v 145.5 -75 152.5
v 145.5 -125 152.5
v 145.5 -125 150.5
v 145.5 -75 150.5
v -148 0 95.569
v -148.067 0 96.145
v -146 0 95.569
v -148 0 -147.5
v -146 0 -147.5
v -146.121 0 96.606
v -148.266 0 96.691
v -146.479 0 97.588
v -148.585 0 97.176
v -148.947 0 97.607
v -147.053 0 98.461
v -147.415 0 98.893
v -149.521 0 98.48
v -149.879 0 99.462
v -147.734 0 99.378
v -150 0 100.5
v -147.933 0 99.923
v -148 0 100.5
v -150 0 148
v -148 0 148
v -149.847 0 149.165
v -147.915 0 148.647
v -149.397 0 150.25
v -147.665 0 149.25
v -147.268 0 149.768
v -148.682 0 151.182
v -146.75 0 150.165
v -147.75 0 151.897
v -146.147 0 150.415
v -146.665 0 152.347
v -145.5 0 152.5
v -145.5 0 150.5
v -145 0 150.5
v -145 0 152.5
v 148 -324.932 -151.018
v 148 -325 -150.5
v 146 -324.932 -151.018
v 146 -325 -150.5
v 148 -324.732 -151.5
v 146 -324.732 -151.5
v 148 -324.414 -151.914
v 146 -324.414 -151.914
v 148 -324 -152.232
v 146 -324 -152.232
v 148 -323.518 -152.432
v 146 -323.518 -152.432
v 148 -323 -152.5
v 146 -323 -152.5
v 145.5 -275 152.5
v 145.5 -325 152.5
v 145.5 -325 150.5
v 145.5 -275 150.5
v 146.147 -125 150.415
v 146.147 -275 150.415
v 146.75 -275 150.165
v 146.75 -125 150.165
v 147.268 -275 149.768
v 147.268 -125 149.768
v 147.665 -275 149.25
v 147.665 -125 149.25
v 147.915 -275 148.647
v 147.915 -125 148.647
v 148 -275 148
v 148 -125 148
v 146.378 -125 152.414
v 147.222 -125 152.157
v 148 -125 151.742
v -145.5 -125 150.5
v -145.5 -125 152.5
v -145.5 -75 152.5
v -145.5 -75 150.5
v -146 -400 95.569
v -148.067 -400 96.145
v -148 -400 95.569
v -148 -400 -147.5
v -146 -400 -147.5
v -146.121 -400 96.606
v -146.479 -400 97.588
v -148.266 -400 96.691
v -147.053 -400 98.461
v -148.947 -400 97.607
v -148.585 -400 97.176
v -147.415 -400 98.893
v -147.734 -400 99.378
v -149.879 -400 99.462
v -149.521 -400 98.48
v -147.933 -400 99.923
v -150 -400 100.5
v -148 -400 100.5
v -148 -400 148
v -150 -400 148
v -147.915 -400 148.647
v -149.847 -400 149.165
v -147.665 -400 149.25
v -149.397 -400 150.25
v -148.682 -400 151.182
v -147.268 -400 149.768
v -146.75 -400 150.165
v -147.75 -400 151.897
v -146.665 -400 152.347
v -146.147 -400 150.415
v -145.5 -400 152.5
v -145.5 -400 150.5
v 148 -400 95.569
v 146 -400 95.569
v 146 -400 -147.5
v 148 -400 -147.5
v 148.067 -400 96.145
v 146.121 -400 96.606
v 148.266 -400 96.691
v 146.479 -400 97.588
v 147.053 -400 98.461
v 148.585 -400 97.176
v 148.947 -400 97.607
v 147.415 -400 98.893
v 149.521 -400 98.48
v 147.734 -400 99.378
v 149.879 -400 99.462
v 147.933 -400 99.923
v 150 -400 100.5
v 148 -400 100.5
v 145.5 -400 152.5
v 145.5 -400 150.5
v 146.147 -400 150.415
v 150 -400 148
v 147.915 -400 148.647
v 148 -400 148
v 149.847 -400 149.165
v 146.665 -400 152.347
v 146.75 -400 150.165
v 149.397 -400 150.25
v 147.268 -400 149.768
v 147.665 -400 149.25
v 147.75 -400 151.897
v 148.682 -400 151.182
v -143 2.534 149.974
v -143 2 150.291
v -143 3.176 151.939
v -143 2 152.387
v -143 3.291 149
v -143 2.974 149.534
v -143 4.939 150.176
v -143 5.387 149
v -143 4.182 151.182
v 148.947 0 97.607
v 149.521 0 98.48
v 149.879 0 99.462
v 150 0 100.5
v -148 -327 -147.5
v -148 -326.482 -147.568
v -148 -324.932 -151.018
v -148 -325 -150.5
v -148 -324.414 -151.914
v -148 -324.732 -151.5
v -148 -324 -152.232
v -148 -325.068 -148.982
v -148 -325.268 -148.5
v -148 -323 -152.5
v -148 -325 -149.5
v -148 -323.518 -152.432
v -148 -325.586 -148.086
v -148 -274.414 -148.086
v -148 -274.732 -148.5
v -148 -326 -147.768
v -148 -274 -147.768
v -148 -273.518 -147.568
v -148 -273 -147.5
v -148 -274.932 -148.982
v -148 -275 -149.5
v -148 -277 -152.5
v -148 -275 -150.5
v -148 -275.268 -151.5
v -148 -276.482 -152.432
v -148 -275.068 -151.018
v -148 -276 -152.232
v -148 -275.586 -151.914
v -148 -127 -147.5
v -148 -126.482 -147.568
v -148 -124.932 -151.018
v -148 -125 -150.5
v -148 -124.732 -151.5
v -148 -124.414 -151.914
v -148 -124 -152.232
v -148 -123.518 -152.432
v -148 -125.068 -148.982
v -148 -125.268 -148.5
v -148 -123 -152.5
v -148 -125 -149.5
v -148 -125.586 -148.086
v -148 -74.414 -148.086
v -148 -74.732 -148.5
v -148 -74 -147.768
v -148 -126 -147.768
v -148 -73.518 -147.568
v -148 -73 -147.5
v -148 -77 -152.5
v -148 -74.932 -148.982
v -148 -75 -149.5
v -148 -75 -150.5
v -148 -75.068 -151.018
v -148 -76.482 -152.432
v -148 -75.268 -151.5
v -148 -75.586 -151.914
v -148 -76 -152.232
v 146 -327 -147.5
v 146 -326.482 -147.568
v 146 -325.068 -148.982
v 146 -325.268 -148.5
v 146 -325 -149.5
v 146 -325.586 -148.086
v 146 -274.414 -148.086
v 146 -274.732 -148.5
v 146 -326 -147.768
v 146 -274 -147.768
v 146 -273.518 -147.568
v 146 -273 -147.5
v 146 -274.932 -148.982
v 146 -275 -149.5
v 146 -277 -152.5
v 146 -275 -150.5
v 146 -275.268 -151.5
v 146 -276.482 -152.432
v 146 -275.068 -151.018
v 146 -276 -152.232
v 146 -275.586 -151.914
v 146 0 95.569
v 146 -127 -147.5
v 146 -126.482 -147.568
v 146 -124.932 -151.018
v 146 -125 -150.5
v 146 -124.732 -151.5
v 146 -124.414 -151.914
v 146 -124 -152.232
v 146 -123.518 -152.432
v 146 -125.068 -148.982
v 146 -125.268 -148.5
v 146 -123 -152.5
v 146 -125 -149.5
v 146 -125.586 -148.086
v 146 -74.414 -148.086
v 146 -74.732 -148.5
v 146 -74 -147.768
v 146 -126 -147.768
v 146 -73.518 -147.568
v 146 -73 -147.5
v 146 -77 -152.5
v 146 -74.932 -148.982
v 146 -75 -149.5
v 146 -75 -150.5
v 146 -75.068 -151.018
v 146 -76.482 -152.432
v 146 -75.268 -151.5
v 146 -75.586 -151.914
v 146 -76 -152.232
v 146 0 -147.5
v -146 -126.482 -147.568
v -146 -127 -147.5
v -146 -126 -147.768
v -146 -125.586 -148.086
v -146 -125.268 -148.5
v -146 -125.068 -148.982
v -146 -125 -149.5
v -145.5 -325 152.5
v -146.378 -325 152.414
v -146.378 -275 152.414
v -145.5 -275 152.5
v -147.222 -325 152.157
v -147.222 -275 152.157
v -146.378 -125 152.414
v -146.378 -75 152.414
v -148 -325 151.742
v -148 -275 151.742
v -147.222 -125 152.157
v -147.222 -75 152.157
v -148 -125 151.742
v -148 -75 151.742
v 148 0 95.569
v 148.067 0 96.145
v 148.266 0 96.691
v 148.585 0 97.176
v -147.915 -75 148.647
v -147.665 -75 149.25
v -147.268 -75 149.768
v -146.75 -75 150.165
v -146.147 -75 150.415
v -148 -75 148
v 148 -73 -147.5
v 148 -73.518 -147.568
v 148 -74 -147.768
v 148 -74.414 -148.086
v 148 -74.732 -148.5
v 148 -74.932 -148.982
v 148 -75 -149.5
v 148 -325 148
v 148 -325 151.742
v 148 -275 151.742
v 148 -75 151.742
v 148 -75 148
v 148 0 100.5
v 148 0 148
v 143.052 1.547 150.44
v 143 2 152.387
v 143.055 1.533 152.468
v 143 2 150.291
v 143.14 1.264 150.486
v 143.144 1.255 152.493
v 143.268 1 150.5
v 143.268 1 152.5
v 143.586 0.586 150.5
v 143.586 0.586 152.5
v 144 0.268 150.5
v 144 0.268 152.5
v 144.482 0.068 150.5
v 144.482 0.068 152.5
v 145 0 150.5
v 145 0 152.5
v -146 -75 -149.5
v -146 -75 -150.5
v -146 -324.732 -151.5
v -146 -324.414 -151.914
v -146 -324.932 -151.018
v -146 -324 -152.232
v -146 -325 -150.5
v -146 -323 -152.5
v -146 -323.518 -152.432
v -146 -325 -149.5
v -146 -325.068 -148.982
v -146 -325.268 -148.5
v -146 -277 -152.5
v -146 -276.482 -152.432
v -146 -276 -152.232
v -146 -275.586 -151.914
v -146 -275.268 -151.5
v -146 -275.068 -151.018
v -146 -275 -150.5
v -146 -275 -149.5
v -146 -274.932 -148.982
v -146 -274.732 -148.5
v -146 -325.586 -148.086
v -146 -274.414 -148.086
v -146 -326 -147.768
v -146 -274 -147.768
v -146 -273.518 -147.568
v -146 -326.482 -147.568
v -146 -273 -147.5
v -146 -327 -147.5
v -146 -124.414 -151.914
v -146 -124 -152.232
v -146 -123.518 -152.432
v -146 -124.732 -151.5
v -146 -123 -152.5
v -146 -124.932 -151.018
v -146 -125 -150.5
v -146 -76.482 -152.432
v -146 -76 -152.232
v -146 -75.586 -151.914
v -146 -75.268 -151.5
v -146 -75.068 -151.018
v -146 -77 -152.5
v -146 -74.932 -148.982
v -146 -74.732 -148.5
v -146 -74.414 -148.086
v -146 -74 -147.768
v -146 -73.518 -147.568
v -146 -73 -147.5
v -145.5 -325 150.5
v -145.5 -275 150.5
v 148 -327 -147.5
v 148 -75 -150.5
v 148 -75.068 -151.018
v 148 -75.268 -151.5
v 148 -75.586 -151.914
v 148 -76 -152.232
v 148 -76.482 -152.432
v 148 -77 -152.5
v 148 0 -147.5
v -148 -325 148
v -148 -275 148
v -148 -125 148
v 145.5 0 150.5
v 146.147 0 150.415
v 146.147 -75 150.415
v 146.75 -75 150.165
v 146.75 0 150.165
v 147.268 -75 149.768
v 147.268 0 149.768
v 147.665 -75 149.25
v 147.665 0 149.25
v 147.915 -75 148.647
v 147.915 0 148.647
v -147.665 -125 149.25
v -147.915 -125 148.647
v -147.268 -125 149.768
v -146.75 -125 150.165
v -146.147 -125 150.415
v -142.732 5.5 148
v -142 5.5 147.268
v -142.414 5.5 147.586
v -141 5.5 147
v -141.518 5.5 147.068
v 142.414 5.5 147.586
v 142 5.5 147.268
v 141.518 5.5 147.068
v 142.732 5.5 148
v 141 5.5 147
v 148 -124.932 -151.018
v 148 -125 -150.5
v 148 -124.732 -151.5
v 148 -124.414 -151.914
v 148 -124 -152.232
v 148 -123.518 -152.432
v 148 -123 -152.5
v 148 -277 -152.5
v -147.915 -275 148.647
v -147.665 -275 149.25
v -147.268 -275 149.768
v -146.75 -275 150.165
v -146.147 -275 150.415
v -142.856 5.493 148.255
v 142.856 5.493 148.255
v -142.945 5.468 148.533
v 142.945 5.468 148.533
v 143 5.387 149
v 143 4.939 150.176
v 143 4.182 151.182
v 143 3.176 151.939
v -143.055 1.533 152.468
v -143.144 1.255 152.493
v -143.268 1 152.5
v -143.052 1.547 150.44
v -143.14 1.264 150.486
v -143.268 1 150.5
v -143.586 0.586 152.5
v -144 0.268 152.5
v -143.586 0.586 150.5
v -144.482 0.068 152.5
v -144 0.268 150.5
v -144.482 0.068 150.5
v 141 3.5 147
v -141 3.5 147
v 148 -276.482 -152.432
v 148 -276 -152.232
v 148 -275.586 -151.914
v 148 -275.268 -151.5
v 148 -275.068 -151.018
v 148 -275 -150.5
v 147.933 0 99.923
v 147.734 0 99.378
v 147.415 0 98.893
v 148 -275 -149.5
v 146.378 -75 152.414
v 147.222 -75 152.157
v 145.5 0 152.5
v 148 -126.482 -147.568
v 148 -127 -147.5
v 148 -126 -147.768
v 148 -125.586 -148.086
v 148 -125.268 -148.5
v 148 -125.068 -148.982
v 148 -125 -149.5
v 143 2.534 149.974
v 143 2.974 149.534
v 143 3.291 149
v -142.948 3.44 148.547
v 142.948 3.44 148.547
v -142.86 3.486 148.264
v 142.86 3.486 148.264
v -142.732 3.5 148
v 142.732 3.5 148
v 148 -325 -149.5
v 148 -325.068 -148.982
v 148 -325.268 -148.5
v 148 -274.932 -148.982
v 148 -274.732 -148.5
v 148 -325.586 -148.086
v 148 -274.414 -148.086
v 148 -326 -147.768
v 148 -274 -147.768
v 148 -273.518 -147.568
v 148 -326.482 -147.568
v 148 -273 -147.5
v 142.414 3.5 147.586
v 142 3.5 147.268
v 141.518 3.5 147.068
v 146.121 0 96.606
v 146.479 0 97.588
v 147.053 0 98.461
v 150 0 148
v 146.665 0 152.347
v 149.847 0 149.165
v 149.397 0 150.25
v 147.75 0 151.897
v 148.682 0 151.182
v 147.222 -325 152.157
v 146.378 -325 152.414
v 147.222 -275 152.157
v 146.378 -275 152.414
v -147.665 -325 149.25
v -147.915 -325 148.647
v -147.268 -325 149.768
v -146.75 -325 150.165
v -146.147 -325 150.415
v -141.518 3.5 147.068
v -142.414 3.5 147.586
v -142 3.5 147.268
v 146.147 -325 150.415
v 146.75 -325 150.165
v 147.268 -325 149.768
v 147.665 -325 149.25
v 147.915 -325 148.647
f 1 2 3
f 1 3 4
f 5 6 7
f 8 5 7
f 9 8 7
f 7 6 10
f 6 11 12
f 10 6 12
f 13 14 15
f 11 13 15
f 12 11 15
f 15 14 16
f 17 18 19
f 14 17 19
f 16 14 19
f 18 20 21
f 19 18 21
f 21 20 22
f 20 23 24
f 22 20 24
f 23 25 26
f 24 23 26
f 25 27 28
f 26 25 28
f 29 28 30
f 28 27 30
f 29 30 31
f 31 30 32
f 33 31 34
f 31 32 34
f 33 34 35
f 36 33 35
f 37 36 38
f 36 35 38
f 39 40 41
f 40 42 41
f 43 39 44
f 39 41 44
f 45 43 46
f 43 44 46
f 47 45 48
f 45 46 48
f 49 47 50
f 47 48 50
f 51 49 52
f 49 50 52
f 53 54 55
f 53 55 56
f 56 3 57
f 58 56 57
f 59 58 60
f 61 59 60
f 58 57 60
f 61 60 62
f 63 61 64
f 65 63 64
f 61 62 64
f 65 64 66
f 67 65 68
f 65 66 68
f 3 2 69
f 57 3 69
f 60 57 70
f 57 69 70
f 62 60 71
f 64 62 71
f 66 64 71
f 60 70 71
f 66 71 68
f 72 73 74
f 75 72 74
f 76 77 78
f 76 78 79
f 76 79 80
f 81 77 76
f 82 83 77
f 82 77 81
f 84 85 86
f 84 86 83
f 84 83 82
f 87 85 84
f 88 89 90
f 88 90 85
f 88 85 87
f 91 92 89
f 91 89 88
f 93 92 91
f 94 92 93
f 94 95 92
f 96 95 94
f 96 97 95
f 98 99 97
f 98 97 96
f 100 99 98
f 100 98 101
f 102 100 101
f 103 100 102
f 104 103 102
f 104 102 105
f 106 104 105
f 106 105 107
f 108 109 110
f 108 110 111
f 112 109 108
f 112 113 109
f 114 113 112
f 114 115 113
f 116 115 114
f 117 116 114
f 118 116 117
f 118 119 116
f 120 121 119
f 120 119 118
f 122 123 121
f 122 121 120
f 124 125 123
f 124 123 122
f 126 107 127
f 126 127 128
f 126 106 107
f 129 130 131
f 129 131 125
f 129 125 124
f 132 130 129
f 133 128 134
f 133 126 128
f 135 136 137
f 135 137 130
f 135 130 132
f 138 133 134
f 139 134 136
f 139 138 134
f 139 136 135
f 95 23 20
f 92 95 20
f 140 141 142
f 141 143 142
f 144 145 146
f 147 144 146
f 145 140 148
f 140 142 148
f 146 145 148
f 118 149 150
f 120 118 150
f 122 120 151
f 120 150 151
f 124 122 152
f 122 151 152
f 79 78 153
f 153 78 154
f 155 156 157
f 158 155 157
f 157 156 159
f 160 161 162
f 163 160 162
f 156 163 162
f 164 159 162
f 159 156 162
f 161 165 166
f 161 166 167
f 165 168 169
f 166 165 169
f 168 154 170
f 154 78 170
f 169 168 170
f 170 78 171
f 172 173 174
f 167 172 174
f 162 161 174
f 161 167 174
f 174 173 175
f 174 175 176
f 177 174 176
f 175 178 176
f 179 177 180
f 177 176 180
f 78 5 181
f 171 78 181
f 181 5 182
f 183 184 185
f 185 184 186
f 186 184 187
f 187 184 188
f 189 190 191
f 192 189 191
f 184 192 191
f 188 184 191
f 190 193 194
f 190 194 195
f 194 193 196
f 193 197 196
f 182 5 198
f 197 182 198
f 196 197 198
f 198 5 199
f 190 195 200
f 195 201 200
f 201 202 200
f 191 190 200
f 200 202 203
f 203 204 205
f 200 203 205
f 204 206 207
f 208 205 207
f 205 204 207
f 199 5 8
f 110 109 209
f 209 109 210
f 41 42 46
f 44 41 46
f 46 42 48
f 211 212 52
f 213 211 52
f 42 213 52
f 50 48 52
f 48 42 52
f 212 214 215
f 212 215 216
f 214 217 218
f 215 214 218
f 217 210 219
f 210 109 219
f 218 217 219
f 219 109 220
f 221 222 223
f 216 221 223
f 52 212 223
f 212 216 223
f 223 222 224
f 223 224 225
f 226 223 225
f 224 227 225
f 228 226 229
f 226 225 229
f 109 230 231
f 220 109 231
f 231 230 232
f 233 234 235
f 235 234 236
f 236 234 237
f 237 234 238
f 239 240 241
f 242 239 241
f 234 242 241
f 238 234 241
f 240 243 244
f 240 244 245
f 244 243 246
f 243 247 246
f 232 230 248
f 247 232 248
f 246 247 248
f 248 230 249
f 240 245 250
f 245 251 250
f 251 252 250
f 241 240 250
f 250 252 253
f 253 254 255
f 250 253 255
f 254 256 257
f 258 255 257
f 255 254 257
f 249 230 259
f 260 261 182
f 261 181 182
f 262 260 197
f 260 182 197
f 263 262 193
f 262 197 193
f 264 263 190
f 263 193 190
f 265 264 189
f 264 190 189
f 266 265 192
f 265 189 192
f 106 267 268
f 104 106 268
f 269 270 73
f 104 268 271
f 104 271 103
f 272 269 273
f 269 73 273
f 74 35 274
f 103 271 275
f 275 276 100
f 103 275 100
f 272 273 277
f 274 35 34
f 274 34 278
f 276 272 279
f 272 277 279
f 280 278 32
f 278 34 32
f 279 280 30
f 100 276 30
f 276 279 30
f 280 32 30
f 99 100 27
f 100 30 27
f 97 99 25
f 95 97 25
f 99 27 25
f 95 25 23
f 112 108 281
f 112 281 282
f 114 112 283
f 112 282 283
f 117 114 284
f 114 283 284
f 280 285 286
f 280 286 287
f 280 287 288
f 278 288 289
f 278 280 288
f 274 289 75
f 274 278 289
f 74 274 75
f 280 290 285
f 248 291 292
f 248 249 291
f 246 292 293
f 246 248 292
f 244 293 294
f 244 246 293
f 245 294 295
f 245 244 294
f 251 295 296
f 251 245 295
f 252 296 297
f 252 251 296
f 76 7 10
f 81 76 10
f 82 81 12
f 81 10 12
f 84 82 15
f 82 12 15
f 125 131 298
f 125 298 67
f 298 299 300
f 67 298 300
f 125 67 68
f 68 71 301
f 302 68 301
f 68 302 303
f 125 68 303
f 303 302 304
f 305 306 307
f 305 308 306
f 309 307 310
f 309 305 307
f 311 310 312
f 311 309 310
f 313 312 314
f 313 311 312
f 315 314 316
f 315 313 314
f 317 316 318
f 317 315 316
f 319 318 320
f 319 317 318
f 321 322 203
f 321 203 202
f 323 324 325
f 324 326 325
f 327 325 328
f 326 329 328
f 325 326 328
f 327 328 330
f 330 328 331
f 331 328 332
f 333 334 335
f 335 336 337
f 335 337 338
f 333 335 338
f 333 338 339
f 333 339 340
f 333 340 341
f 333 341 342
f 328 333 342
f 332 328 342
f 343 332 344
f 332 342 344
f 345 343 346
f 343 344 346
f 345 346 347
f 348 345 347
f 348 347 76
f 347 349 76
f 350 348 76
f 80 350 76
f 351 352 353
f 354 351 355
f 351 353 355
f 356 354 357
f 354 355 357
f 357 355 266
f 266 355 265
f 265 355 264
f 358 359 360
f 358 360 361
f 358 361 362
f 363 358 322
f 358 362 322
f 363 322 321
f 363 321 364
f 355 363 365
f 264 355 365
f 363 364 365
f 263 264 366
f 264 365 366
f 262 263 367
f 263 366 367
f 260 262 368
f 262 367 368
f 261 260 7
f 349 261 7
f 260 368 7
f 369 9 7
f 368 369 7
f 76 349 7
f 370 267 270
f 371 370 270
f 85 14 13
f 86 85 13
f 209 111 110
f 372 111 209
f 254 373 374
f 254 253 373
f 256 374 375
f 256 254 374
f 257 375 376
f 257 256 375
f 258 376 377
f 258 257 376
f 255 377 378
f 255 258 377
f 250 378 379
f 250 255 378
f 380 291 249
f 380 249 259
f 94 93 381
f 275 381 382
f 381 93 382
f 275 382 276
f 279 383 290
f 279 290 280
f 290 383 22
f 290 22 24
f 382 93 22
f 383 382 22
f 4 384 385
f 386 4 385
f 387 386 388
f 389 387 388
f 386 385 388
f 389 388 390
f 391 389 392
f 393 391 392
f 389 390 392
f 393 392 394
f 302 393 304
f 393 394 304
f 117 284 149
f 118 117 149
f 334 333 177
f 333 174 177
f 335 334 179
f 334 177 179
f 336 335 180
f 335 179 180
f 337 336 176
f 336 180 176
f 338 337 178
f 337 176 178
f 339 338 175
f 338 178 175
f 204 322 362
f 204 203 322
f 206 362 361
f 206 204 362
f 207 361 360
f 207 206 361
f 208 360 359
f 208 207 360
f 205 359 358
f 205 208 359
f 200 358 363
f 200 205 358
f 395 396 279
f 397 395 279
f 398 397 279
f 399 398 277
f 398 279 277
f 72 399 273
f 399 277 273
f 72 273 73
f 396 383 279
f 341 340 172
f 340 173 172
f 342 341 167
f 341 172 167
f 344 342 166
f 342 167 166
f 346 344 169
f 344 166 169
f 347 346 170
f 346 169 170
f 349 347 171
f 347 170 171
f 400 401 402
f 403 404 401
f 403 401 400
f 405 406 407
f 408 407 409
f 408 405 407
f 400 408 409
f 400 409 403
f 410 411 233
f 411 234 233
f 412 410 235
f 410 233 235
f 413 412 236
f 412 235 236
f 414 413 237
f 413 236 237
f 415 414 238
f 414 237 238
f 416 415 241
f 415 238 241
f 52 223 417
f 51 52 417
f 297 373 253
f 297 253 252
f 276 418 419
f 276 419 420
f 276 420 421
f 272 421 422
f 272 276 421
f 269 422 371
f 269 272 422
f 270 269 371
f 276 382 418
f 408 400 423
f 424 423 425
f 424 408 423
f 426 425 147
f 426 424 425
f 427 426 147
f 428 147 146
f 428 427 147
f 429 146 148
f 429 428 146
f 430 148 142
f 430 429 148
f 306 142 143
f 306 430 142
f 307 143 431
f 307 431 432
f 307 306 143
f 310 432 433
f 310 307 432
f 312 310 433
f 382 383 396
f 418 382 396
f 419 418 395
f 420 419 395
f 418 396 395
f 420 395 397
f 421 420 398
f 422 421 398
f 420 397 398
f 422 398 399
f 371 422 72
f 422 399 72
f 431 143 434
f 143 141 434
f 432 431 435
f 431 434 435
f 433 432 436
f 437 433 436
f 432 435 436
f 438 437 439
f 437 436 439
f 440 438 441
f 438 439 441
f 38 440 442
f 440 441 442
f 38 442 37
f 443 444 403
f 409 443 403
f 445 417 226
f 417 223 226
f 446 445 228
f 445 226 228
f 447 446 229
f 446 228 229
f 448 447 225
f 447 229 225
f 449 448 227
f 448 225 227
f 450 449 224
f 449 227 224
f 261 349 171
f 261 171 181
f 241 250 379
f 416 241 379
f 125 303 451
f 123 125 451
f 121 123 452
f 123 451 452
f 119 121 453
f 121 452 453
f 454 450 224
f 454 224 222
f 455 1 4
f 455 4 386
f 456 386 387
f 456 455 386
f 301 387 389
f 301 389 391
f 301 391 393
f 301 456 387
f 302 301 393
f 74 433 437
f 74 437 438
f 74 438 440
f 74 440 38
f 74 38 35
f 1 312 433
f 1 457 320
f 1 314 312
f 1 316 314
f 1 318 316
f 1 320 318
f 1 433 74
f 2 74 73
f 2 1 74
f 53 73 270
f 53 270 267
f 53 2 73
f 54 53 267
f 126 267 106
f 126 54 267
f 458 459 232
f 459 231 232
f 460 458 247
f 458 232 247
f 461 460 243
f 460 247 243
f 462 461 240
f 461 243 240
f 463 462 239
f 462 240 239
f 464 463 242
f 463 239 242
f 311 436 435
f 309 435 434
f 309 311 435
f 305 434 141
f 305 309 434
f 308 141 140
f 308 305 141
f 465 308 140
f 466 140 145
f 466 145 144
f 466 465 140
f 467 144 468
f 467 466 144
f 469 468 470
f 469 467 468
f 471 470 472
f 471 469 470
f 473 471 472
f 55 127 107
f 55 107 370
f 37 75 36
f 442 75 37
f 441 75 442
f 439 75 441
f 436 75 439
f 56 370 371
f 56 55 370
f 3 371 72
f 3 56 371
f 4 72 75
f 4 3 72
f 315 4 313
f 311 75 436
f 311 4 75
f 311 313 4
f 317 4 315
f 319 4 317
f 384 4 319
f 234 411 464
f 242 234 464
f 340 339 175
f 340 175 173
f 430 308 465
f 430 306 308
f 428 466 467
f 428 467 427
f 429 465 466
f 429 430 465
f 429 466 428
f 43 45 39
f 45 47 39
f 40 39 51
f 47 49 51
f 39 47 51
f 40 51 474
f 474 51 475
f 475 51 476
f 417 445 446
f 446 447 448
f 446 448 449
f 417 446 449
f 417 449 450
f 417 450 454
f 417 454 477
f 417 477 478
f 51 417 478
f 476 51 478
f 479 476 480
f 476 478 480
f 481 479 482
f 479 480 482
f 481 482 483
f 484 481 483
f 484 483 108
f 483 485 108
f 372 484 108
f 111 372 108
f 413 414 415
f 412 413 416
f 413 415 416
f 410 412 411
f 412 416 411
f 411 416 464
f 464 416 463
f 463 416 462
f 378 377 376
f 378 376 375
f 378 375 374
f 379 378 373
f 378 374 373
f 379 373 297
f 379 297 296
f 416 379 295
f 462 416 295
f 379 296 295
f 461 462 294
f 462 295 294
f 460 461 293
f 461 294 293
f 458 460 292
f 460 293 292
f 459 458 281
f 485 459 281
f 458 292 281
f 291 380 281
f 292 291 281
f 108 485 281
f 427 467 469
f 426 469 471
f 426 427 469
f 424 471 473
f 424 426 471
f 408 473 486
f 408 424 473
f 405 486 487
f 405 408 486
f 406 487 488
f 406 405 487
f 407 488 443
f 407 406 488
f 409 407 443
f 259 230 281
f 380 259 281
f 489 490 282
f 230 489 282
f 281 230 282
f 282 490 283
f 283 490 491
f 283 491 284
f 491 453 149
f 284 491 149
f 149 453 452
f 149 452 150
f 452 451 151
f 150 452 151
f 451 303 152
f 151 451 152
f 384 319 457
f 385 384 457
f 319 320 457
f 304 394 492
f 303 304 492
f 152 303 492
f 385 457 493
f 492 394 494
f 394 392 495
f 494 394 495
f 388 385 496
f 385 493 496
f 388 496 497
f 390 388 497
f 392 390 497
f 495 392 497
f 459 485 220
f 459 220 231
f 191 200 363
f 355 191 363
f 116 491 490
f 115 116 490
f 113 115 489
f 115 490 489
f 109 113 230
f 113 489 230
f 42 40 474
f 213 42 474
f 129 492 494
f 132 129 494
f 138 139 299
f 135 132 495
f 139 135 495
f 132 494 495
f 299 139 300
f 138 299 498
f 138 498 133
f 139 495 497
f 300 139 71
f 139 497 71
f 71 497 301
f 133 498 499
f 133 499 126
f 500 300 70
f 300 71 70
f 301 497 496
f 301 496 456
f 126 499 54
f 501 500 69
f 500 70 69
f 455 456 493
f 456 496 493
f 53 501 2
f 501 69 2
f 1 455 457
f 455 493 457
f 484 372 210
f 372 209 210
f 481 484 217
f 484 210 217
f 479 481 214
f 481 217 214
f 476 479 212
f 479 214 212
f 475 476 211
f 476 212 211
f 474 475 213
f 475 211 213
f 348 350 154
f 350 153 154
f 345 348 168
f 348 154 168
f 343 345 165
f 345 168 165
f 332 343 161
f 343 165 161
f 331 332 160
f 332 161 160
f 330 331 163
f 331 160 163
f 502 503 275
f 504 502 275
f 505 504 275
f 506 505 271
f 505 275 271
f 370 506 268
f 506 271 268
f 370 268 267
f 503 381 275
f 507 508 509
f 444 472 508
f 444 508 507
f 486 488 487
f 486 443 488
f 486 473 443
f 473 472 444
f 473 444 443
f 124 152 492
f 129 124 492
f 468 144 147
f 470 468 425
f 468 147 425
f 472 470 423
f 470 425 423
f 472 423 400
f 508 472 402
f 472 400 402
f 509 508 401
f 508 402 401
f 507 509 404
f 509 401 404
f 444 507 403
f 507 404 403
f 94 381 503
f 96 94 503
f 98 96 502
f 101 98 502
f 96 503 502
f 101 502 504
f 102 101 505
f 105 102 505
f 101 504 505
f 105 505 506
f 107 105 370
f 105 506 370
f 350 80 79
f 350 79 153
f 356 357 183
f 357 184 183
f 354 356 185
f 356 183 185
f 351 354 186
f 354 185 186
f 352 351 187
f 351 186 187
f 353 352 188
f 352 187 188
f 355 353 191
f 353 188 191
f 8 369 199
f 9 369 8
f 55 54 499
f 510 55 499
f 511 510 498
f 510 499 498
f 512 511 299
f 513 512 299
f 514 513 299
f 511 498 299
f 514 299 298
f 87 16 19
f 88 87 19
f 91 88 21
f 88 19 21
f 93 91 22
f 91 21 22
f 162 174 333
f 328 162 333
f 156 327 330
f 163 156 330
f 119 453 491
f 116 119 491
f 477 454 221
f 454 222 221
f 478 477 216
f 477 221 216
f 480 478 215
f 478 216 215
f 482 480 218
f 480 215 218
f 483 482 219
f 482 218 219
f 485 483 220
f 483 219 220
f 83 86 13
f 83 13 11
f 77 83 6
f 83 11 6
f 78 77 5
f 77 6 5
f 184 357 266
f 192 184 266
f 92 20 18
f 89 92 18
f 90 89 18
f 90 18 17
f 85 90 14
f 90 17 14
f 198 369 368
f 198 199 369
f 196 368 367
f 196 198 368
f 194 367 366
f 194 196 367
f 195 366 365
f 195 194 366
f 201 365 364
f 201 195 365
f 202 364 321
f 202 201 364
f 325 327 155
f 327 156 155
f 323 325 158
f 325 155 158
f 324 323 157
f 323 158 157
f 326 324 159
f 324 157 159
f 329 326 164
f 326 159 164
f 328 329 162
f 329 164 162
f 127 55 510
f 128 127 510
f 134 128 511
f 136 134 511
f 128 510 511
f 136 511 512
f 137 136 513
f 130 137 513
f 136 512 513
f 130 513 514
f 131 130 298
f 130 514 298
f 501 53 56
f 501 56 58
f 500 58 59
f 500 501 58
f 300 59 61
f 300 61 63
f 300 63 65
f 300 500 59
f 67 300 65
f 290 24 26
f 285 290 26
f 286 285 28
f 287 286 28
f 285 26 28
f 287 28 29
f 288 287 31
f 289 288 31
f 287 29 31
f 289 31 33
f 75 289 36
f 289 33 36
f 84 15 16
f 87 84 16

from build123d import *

# Parameters (mm, degrees)
F1_DEPTH      = 400
F2_W          = 150
F2_H          = 5
F2_W_2        = 75
F3_DEPTH      = 645
F4_W          = 2.5
F4_H          = 50
F5_DEPTH      = 21
F6_R          = 2
F8_DEPTH      = 143
F8_DEPTH_BACK = 143
F9_R          = 2


with BuildPart() as f1:
    # F0 (on Front) → F1 (new body)
    with BuildSketch(Plane.XZ):
        with BuildLine():
            ThreePointArc((150, 148), (148.6819805153, 151.1819805153), (145.5, 152.5))
            Line((145.5, 152.5), (0, 152.5))
            Line((0, 152.5), (-145.5, 152.5))
            ThreePointArc((-145.5, 152.5), (-148.6819805153, 151.1819805153), (-150, 148))
            Line((-150, 148), (-150, 100.5))
            ThreePointArc((-150, 100.5), (-149.7286167935, 98.960909355), (-148.947199994, 97.6074557564))
            Line((-148.947199994, 97.6074557564), (-148.5848888922, 97.1756701992))
            ThreePointArc((-148.5848888922, 97.1756701992), (-148.150768448, 96.4237515333), (-148, 95.5687011749))
            Line((-148, 95.5687011749), (-148, -152.5))
            Line((-148, -152.5), (-146, -152.5))
            Line((-146, -152.5), (-146, 95.5687011749))
            ThreePointArc((-146, 95.5687011749), (-146.2713832065, 97.1077918199), (-147.052800006, 98.4612454185))
            Line((-147.052800006, 98.4612454185), (-147.4151111078, 98.8930309758))
            ThreePointArc((-147.4151111078, 98.8930309758), (-147.849231552, 99.6449496417), (-148, 100.5))
            Line((-148, 100.5), (-148, 148))
            ThreePointArc((-148, 148), (-147.267766953, 149.767766953), (-145.5, 150.5))
            Line((-145.5, 150.5), (0, 150.5))
            Line((0, 150.5), (145.5, 150.5))
            ThreePointArc((145.5, 150.5), (147.267766953, 149.767766953), (148, 148))
            Line((148, 148), (148, 100.5))
            ThreePointArc((148, 100.5), (147.849231552, 99.6449496417), (147.4151111078, 98.8930309758))
            Line((147.4151111078, 98.8930309758), (147.052800006, 98.4612454185))
            ThreePointArc((147.052800006, 98.4612454185), (146.2713832065, 97.1077918199), (146, 95.5687011749))
            Line((146, 95.5687011749), (146, -152.5))
            Line((146, -152.5), (148, -152.5))
            Line((148, -152.5), (148, 95.5687011749))
            ThreePointArc((148, 95.5687011749), (148.150768448, 96.4237515333), (148.5848888922, 97.1756701992))
            Line((148.5848888922, 97.1756701992), (148.947199994, 97.6074557564))
            ThreePointArc((148.947199994, 97.6074557564), (149.7286167935, 98.960909355), (150, 100.5))
            Line((150, 100.5), (150, 148))
        make_face()
    extrude(amount=F1_DEPTH)

    # F2 (on face) → F3 (cut)
    with BuildSketch(Plane.YZ.offset(148)):
        with Locations((-200, -150)):
            Rectangle(F2_W, F2_H)
        with Locations((-37.5, -150)):
            Rectangle(F2_W_2, F2_H)
        with Locations((-362.5, -150)):
            Rectangle(F2_W_2, F2_H)
    extrude(amount=-F3_DEPTH, mode=Mode.SUBTRACT)

    # F4 (on face) → F5 (cut)
    with BuildSketch(Plane.XY.offset(152.5)):
        with Locations((146.75, -100)):
            Rectangle(F4_W, F4_H)
        with Locations((146.75, -300)):
            Rectangle(F4_W, F4_H)
        with Locations((-146.75, -100)):
            Rectangle(F4_W, F4_H)
        with Locations((-146.75, -300)):
            Rectangle(F4_W, F4_H)
    extrude(amount=-F5_DEPTH, mode=Mode.SUBTRACT)

    # F6
    f6_edges = [f1.edges().sort_by_distance(p)[0] for p in [
        (147, -125, -147.5),
        (147, -325, -147.5),
        (-147, -325, -147.5),
        (-147, -125, -147.5),
        (147, -75, -147.5),
        (147, -275, -147.5),
        (-147, -275, -147.5),
        (-147, -75, -147.5),
        (147, -325, -152.5),
        (147, -125, -152.5),
        (-147, -325, -152.5),
        (-147, -125, -152.5),
        (147, -275, -152.5),
        (147, -75, -152.5),
        (-147, -275, -152.5),
        (-147, -75, -152.5),
    ]]
    fillet(f6_edges, radius=F6_R)

    # F7 (on Right) → F8 (join, two sides)
    with BuildSketch(Plane.YZ) as f8_sk:
        with BuildLine():
            Line((1, 152.5), (0, 152.5))
            Line((0, 152.5), (0, 150.5))
            Line((0, 150.5), (1, 150.5))
            ThreePointArc((1, 150.5), (2.767766953, 149.767766953), (3.5, 148))
            Line((3.5, 148), (3.5, 147))
            Line((3.5, 147), (5.5, 147))
            Line((5.5, 147), (5.5, 148))
            ThreePointArc((5.5, 148), (4.1819805153, 151.1819805153), (1, 152.5))
        make_face()
    extrude(amount=F8_DEPTH)
    extrude(f8_sk.sketch, amount=-F8_DEPTH_BACK)

    # F9 (call 1 of 4: OpenCascade refuses the feature's edges together)
    f9_edges = [f1.edges().sort_by_distance(p)[0] for p in [
        (143, 0, 151.5),
    ]]
    fillet(f9_edges, radius=F9_R)

    # F9#2 (call 2 of 4)
    f9_2_edges = [f1.edges().sort_by_distance(p)[0] for p in [
        (-143, 0, 151.5),
    ]]
    fillet(f9_2_edges, radius=F9_R)

    # F9#3 (call 3 of 4)
    f9_3_edges = [f1.edges().sort_by_distance(p)[0] for p in [
        (-143, 4.5, 147),
    ]]
    fillet(f9_3_edges, radius=F9_R)

    # F9#4 (call 4 of 4)
    f9_4_edges = [f1.edges().sort_by_distance(p)[0] for p in [
        (143, 4.5, 147),
    ]]
    fillet(f9_4_edges, radius=F9_R)


solid = f1.part
